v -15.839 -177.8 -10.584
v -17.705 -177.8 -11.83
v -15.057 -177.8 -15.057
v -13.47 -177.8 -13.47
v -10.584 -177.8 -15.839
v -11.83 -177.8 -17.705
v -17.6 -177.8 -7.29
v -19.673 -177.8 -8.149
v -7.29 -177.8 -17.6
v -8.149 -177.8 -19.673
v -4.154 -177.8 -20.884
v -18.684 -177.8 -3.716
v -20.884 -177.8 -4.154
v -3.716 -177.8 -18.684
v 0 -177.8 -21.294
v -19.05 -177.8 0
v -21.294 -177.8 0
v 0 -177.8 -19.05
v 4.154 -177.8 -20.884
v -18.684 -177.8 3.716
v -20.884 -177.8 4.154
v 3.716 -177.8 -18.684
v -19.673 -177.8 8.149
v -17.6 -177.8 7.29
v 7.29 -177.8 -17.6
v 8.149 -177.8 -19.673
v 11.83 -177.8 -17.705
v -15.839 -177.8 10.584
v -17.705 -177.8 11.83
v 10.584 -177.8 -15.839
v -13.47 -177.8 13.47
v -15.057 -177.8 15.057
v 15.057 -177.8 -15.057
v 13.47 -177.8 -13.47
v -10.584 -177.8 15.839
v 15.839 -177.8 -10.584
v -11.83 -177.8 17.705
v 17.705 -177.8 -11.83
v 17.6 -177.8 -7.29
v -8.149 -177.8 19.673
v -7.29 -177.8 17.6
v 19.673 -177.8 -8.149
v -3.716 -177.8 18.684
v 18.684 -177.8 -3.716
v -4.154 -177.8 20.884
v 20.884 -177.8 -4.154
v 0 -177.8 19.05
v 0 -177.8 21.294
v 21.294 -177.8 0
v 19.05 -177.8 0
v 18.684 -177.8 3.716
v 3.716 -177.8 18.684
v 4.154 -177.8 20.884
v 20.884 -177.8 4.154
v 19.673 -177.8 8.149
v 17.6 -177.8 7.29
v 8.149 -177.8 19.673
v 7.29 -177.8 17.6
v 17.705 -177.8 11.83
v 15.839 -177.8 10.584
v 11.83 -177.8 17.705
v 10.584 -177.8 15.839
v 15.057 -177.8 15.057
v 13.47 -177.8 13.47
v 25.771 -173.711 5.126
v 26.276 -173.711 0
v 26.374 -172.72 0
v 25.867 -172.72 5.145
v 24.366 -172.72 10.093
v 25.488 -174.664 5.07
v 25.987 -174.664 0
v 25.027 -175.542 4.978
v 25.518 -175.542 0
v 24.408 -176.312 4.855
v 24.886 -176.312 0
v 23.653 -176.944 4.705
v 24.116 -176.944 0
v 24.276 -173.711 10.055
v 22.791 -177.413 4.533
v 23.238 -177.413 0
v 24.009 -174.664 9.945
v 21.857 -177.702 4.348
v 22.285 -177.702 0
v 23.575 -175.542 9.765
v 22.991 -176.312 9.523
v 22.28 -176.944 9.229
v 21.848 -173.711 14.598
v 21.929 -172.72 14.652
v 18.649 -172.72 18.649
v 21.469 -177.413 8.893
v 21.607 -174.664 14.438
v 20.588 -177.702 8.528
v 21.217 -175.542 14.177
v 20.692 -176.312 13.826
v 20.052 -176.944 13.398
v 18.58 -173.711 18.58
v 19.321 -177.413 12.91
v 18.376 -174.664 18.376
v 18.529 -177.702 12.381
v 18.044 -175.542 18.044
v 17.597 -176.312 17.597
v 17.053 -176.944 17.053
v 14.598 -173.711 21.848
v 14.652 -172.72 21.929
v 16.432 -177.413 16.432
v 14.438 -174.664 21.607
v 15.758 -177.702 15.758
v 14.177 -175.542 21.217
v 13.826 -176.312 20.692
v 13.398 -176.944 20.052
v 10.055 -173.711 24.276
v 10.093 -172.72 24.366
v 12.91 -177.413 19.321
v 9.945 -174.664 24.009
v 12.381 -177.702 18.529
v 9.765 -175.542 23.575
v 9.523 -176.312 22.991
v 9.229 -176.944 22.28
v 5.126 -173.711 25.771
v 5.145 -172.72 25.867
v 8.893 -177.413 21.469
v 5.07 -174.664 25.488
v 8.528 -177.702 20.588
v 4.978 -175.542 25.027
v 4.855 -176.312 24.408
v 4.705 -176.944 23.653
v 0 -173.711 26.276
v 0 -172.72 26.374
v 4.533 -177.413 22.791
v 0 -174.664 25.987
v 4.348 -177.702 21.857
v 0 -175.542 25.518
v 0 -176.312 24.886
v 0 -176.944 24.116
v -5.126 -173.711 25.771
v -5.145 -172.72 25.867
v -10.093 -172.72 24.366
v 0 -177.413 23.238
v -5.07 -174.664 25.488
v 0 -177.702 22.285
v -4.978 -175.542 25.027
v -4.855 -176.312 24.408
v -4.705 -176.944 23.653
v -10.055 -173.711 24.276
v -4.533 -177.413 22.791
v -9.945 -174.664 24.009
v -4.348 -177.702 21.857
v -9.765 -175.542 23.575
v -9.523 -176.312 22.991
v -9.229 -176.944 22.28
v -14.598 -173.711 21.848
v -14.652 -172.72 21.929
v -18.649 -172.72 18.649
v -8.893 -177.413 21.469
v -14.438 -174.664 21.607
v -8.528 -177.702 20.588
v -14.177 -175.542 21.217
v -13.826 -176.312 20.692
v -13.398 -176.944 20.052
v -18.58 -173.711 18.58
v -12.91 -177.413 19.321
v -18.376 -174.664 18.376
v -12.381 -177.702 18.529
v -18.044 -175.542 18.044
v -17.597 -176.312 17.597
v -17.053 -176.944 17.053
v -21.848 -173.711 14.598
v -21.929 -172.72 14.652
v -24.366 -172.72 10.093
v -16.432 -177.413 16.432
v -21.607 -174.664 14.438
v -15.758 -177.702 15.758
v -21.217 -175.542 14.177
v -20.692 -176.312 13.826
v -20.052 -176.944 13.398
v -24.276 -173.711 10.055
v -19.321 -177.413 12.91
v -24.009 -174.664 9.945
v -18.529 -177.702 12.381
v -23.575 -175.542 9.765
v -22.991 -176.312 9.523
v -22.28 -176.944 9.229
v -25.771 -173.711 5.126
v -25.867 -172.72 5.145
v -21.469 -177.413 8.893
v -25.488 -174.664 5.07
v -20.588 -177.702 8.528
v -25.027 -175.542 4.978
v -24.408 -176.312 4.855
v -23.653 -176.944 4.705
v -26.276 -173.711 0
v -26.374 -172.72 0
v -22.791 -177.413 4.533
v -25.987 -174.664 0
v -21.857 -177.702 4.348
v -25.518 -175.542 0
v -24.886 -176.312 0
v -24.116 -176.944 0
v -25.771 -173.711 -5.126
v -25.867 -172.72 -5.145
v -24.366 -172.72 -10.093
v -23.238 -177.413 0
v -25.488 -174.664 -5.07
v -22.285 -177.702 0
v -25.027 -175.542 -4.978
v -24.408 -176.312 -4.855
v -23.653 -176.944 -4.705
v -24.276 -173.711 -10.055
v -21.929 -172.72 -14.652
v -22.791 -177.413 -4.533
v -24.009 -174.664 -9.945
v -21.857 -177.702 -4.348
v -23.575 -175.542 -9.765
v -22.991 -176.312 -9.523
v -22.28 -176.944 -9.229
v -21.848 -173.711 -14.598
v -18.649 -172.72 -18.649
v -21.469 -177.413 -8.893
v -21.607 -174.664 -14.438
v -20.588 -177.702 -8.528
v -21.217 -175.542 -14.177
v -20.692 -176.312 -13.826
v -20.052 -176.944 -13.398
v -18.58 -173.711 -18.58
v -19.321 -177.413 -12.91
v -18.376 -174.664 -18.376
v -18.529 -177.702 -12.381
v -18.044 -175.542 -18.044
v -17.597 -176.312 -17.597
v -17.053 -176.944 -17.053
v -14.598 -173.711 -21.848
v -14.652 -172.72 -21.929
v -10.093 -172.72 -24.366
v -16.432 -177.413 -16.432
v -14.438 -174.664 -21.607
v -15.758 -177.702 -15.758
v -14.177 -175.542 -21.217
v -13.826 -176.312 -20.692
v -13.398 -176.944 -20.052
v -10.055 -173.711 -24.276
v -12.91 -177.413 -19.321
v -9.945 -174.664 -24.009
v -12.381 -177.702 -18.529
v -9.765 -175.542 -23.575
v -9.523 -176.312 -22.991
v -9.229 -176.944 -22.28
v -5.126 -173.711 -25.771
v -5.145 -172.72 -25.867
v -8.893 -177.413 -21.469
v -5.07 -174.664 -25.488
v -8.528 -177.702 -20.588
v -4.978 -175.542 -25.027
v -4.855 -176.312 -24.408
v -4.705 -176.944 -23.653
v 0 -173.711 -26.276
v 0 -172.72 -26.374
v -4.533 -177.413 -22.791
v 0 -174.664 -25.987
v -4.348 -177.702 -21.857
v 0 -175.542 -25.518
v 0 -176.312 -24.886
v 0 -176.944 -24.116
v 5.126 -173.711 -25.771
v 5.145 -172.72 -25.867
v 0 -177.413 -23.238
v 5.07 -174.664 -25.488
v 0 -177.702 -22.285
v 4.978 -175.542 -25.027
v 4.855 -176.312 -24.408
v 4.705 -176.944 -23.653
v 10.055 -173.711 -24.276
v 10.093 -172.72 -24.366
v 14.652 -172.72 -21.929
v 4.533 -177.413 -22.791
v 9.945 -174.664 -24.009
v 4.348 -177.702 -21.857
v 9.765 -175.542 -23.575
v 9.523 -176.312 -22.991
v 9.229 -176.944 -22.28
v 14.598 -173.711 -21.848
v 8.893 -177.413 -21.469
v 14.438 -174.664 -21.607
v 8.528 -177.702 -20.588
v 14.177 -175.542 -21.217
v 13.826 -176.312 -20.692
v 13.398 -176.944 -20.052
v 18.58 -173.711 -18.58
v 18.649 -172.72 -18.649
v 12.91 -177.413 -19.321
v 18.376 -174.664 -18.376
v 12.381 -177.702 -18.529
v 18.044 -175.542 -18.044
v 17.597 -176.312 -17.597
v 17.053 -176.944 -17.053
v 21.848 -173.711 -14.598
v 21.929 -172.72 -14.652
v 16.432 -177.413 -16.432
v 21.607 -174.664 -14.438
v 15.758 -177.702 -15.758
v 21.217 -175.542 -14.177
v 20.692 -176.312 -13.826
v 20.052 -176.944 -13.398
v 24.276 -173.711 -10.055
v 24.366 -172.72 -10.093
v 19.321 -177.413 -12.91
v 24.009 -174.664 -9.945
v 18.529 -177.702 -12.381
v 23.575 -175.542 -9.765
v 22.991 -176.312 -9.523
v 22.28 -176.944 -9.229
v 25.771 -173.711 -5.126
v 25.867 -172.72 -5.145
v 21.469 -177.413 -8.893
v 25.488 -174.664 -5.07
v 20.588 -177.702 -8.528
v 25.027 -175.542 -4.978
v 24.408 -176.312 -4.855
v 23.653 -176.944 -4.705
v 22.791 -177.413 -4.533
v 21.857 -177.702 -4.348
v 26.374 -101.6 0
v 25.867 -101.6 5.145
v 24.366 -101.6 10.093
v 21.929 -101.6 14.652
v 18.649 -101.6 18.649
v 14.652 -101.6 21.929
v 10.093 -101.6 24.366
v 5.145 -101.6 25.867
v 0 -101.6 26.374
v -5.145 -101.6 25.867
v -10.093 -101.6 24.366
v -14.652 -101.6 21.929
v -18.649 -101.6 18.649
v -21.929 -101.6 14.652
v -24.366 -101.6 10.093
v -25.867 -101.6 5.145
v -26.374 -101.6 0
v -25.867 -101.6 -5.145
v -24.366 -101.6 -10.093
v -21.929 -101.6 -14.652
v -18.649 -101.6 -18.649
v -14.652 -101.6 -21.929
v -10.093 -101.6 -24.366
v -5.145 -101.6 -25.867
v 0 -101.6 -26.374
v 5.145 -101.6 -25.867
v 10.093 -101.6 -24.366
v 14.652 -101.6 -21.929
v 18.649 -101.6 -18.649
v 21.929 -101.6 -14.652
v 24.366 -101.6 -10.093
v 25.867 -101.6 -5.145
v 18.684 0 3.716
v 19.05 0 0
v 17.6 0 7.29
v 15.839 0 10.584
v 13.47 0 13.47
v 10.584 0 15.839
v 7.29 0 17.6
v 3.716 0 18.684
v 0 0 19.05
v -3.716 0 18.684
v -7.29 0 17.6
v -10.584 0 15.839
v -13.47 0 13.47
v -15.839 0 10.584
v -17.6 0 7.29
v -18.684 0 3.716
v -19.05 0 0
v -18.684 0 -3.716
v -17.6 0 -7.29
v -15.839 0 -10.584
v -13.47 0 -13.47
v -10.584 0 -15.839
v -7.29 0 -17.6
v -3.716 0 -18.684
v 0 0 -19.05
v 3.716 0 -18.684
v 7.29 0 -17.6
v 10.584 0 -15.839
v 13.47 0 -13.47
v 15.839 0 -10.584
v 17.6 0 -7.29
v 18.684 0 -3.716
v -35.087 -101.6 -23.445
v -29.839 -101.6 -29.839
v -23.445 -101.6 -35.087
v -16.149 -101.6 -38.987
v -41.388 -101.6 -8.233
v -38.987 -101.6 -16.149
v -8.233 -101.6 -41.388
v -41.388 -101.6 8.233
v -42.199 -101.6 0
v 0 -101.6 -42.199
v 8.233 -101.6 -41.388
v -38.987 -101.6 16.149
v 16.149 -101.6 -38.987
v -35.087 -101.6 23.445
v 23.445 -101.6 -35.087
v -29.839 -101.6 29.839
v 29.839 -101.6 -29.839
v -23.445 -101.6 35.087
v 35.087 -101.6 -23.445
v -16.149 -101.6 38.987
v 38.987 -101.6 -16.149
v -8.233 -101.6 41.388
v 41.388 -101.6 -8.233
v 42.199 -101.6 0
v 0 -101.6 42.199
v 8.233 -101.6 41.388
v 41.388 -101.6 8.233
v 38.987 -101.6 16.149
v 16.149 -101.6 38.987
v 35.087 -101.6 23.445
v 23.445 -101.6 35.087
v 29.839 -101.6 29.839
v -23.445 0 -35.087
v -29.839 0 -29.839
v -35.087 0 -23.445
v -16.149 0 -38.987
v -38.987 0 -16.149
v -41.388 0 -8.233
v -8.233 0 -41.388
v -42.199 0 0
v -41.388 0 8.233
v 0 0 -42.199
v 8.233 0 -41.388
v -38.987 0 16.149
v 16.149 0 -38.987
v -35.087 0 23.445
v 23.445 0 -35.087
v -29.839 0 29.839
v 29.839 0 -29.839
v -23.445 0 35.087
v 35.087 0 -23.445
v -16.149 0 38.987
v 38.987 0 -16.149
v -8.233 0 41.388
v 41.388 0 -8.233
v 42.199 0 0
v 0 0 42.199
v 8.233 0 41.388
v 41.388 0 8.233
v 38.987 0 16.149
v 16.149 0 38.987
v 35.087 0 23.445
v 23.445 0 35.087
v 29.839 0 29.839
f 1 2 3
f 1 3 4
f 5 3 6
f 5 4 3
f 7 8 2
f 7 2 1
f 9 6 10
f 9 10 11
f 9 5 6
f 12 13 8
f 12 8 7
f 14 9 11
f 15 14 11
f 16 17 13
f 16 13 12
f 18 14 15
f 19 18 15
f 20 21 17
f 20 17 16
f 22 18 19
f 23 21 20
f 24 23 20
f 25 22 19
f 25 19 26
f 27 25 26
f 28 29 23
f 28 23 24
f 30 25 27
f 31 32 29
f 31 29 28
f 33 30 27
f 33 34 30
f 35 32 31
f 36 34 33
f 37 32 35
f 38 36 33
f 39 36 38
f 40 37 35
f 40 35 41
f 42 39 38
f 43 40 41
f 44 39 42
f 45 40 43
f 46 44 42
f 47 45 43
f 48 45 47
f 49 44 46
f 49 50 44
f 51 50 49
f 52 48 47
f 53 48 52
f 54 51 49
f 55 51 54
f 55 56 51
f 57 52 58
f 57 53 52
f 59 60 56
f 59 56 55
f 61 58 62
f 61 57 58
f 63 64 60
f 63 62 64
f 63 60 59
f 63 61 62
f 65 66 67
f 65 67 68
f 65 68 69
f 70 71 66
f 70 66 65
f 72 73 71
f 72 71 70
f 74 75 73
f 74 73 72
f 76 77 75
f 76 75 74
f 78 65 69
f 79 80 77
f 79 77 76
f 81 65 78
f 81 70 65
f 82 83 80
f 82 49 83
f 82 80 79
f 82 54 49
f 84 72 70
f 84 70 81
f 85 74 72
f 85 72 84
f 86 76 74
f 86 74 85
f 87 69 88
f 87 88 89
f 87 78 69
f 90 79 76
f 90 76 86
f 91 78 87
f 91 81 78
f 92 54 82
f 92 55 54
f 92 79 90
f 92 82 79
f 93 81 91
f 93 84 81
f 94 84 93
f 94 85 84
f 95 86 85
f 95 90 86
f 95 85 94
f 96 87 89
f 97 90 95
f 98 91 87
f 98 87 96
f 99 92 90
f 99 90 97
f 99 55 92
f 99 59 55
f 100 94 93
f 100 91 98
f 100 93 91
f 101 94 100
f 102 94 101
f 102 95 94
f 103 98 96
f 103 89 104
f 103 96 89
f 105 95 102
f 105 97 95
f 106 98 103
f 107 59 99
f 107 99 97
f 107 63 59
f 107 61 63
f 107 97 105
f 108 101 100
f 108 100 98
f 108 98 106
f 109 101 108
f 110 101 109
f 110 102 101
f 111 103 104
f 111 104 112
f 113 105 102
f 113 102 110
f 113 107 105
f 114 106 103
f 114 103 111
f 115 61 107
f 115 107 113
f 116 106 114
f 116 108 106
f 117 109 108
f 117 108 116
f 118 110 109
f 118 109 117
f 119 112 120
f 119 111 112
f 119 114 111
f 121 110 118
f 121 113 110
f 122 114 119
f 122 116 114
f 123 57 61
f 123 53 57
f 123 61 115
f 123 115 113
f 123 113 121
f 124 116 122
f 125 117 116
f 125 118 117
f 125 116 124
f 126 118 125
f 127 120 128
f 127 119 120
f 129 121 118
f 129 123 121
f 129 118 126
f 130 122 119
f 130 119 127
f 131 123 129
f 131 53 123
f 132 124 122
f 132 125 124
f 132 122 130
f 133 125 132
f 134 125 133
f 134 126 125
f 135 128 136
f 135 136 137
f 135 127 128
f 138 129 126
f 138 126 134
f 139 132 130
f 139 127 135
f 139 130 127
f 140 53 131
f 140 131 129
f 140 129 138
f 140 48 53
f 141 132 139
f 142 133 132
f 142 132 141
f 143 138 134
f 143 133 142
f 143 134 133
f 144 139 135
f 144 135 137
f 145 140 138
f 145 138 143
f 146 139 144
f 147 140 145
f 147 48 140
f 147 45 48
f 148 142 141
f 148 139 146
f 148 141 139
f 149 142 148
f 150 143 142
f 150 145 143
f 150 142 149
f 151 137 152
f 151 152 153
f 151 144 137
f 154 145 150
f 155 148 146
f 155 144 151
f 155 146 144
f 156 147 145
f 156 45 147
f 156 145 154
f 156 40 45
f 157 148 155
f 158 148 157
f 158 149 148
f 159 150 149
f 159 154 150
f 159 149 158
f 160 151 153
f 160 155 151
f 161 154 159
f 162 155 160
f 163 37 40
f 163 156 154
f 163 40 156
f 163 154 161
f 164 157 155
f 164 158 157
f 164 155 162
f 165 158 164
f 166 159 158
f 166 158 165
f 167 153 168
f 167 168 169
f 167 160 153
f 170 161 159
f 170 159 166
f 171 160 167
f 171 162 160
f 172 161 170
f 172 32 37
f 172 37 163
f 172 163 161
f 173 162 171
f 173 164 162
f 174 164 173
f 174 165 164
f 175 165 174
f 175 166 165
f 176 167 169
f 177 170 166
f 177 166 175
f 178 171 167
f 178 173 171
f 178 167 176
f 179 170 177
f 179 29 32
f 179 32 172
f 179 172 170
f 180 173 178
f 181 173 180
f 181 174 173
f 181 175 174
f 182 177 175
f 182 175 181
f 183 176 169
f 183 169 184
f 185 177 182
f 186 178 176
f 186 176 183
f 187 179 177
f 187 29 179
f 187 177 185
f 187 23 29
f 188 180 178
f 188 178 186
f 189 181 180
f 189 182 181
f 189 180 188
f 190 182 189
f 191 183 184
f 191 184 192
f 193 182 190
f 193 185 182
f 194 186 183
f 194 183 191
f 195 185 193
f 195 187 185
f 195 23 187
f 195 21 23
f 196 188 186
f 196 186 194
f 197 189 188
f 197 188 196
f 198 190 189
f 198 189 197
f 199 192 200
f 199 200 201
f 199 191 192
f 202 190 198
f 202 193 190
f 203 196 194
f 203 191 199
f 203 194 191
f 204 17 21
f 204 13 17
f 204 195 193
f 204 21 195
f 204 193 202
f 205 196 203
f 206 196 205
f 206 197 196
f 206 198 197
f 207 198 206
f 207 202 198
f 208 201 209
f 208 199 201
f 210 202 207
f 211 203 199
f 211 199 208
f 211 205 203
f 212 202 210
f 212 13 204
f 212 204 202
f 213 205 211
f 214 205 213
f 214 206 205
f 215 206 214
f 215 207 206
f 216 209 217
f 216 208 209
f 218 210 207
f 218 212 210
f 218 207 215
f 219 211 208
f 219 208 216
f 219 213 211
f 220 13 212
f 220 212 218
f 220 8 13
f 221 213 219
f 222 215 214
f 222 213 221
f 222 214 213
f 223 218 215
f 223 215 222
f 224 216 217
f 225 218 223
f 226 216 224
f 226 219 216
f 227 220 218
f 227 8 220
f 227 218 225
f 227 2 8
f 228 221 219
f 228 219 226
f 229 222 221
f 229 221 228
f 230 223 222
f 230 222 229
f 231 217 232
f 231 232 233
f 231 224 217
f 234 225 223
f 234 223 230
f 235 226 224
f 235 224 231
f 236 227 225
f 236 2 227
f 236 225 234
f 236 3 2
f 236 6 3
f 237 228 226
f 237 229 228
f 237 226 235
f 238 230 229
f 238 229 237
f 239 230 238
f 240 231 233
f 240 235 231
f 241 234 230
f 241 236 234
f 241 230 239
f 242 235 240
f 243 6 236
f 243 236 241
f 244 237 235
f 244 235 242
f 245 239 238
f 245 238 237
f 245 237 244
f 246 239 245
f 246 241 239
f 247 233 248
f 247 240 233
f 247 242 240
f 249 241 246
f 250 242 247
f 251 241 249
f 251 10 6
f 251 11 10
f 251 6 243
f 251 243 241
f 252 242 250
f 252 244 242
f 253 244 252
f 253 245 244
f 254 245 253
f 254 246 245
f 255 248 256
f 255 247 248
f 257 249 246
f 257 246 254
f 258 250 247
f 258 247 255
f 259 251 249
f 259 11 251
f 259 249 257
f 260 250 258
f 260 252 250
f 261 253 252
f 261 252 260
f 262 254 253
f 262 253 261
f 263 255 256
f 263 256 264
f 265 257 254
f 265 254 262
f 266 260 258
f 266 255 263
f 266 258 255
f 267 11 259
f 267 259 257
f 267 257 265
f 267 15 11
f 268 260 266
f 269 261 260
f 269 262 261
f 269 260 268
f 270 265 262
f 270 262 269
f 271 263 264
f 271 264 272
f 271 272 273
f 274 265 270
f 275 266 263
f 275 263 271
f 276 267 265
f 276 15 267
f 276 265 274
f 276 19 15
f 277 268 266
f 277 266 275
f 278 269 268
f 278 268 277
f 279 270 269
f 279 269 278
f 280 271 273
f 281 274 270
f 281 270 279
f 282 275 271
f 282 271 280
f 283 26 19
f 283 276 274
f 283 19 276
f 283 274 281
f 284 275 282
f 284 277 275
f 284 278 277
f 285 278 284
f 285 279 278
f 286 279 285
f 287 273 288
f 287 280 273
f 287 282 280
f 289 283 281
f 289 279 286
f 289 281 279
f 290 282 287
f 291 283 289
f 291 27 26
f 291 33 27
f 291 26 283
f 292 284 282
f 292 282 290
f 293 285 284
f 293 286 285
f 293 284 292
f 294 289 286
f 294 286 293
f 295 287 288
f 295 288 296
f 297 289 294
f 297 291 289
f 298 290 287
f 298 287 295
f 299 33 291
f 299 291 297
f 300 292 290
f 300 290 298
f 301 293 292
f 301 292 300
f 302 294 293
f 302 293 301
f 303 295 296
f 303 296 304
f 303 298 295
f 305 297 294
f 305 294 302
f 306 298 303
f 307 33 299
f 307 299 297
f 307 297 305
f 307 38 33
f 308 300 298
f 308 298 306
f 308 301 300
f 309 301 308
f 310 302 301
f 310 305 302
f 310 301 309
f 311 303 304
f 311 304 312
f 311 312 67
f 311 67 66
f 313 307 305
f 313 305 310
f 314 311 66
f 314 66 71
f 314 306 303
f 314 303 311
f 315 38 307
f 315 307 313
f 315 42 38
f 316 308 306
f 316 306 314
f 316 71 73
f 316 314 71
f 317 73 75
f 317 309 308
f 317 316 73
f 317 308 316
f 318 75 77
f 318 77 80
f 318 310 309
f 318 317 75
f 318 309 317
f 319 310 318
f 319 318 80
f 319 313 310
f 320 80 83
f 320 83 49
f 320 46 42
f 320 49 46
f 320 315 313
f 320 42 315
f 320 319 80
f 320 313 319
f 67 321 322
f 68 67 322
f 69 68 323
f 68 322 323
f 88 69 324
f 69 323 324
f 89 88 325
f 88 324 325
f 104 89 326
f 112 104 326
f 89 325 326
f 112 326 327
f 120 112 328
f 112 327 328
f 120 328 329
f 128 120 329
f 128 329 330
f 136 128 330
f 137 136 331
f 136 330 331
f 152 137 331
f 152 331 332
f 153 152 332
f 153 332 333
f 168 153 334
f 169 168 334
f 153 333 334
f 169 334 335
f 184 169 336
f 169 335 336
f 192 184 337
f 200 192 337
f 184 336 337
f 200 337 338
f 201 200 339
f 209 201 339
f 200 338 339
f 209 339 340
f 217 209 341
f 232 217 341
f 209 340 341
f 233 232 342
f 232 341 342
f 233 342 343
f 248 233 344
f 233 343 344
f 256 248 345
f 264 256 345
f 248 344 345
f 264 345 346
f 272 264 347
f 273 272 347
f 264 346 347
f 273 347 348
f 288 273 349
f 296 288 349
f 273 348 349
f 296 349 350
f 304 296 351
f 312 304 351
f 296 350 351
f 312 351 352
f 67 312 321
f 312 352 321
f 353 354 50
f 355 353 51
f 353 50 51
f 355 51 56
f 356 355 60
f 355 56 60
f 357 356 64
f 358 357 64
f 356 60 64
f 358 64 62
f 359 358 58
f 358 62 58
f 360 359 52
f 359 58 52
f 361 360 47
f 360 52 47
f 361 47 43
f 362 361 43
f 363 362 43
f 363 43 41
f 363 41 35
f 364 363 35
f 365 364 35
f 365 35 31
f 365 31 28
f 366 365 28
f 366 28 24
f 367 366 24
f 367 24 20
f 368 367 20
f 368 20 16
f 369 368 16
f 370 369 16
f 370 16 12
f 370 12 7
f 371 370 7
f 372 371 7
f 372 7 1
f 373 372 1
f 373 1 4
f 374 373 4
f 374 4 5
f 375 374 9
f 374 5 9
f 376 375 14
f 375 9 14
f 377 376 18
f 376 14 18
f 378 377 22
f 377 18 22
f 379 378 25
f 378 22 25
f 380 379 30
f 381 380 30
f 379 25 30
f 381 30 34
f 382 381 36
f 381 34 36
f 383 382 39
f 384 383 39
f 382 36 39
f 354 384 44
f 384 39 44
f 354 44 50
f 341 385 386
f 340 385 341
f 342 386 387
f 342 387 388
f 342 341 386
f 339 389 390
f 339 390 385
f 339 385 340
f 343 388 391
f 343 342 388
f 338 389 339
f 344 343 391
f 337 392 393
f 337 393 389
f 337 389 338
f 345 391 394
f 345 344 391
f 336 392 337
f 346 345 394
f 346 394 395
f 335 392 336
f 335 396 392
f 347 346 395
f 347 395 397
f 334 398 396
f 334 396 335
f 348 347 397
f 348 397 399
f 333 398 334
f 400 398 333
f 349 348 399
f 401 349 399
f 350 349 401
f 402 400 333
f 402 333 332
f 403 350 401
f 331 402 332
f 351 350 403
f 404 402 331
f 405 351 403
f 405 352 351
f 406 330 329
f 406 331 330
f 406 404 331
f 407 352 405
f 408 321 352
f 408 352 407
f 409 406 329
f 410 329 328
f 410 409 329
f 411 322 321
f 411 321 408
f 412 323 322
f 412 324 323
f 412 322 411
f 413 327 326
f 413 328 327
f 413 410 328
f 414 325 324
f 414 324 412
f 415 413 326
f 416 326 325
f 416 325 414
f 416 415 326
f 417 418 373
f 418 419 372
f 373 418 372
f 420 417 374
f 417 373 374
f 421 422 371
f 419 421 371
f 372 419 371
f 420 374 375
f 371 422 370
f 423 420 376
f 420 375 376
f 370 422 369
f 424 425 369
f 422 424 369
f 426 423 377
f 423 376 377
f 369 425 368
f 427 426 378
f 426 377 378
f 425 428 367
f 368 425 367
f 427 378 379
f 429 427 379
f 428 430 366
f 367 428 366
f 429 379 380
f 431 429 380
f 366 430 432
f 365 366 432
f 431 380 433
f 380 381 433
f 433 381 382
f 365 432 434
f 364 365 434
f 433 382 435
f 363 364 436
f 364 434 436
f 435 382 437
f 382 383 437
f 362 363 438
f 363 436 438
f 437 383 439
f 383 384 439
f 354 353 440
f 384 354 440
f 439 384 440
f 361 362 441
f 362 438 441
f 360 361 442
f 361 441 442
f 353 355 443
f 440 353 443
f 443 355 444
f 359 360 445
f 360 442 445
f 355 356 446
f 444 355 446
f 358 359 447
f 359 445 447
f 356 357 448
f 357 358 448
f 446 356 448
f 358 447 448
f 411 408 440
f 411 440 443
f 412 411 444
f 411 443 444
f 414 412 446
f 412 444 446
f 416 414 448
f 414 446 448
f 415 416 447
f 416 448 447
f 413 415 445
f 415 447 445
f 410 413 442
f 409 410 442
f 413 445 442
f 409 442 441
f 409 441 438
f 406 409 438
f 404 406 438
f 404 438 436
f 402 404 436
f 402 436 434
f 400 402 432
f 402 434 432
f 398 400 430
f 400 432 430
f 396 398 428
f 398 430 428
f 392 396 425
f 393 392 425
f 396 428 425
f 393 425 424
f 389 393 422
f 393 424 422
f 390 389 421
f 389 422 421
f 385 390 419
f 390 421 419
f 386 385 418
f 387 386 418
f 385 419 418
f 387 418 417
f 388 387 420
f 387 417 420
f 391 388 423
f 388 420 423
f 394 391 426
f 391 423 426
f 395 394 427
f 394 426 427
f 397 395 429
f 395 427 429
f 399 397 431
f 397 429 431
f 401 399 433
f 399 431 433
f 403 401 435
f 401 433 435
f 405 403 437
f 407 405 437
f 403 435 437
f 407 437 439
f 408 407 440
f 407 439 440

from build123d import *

# Parameters (mm, degrees)
F0_R      = 42.199156
F1_DEPTH  = 50.8
F2_R      = 26.140573
F3_DEPTH  = 25.4
F4_R      = 17.712335
F5_DEPTH  = 25.4
F6_R      = 23.120753
F1_FACE_R = 42.199156
F7_DEPTH  = 50.8
F8_R      = 26.373647
F9_DEPTH  = 76.2
F10_R     = 19.05
F11_DEPTH = 254
F12_R     = 5.08


with BuildPart() as f1:
    # F0 (on Front) → F1 (new body)
    with BuildSketch(Plane.XZ):
        Circle(F0_R)
    extrude(amount=F1_DEPTH)

    # F2 (on Front) → F3 (join)
    with BuildSketch(Plane.XZ):
        Circle(F2_R)
    extrude(amount=F3_DEPTH)

    # F4 (on Front) → F5 (join)
    with BuildSketch(Plane.XZ):
        Circle(F4_R)
    extrude(amount=F5_DEPTH)

    # F6 (on Front) + F1_face (on face) → F7 (join)
    with BuildSketch(Plane.XZ):
        Circle(F6_R)
    with BuildSketch(Plane.XZ.offset(50.8)):
        Circle(F1_FACE_R)
    extrude(amount=F7_DEPTH)

    # F8 (on face) → F9 (join)
    with BuildSketch(Plane.XZ.offset(101.6)):
        Circle(F8_R)
    extrude(amount=F9_DEPTH)

    # F10 (on face) → F11 (cut)
    with BuildSketch(Plane.XZ.offset(177.8)):
        Circle(F10_R)
    extrude(amount=-F11_DEPTH, mode=Mode.SUBTRACT)

    # F12
    f12_edges = [f1.edges().sort_by_distance(p)[0] for p in [
        (-26.373647, -177.8, 0),
    ]]
    fillet(f12_edges, radius=F12_R)


solid = f1.part
